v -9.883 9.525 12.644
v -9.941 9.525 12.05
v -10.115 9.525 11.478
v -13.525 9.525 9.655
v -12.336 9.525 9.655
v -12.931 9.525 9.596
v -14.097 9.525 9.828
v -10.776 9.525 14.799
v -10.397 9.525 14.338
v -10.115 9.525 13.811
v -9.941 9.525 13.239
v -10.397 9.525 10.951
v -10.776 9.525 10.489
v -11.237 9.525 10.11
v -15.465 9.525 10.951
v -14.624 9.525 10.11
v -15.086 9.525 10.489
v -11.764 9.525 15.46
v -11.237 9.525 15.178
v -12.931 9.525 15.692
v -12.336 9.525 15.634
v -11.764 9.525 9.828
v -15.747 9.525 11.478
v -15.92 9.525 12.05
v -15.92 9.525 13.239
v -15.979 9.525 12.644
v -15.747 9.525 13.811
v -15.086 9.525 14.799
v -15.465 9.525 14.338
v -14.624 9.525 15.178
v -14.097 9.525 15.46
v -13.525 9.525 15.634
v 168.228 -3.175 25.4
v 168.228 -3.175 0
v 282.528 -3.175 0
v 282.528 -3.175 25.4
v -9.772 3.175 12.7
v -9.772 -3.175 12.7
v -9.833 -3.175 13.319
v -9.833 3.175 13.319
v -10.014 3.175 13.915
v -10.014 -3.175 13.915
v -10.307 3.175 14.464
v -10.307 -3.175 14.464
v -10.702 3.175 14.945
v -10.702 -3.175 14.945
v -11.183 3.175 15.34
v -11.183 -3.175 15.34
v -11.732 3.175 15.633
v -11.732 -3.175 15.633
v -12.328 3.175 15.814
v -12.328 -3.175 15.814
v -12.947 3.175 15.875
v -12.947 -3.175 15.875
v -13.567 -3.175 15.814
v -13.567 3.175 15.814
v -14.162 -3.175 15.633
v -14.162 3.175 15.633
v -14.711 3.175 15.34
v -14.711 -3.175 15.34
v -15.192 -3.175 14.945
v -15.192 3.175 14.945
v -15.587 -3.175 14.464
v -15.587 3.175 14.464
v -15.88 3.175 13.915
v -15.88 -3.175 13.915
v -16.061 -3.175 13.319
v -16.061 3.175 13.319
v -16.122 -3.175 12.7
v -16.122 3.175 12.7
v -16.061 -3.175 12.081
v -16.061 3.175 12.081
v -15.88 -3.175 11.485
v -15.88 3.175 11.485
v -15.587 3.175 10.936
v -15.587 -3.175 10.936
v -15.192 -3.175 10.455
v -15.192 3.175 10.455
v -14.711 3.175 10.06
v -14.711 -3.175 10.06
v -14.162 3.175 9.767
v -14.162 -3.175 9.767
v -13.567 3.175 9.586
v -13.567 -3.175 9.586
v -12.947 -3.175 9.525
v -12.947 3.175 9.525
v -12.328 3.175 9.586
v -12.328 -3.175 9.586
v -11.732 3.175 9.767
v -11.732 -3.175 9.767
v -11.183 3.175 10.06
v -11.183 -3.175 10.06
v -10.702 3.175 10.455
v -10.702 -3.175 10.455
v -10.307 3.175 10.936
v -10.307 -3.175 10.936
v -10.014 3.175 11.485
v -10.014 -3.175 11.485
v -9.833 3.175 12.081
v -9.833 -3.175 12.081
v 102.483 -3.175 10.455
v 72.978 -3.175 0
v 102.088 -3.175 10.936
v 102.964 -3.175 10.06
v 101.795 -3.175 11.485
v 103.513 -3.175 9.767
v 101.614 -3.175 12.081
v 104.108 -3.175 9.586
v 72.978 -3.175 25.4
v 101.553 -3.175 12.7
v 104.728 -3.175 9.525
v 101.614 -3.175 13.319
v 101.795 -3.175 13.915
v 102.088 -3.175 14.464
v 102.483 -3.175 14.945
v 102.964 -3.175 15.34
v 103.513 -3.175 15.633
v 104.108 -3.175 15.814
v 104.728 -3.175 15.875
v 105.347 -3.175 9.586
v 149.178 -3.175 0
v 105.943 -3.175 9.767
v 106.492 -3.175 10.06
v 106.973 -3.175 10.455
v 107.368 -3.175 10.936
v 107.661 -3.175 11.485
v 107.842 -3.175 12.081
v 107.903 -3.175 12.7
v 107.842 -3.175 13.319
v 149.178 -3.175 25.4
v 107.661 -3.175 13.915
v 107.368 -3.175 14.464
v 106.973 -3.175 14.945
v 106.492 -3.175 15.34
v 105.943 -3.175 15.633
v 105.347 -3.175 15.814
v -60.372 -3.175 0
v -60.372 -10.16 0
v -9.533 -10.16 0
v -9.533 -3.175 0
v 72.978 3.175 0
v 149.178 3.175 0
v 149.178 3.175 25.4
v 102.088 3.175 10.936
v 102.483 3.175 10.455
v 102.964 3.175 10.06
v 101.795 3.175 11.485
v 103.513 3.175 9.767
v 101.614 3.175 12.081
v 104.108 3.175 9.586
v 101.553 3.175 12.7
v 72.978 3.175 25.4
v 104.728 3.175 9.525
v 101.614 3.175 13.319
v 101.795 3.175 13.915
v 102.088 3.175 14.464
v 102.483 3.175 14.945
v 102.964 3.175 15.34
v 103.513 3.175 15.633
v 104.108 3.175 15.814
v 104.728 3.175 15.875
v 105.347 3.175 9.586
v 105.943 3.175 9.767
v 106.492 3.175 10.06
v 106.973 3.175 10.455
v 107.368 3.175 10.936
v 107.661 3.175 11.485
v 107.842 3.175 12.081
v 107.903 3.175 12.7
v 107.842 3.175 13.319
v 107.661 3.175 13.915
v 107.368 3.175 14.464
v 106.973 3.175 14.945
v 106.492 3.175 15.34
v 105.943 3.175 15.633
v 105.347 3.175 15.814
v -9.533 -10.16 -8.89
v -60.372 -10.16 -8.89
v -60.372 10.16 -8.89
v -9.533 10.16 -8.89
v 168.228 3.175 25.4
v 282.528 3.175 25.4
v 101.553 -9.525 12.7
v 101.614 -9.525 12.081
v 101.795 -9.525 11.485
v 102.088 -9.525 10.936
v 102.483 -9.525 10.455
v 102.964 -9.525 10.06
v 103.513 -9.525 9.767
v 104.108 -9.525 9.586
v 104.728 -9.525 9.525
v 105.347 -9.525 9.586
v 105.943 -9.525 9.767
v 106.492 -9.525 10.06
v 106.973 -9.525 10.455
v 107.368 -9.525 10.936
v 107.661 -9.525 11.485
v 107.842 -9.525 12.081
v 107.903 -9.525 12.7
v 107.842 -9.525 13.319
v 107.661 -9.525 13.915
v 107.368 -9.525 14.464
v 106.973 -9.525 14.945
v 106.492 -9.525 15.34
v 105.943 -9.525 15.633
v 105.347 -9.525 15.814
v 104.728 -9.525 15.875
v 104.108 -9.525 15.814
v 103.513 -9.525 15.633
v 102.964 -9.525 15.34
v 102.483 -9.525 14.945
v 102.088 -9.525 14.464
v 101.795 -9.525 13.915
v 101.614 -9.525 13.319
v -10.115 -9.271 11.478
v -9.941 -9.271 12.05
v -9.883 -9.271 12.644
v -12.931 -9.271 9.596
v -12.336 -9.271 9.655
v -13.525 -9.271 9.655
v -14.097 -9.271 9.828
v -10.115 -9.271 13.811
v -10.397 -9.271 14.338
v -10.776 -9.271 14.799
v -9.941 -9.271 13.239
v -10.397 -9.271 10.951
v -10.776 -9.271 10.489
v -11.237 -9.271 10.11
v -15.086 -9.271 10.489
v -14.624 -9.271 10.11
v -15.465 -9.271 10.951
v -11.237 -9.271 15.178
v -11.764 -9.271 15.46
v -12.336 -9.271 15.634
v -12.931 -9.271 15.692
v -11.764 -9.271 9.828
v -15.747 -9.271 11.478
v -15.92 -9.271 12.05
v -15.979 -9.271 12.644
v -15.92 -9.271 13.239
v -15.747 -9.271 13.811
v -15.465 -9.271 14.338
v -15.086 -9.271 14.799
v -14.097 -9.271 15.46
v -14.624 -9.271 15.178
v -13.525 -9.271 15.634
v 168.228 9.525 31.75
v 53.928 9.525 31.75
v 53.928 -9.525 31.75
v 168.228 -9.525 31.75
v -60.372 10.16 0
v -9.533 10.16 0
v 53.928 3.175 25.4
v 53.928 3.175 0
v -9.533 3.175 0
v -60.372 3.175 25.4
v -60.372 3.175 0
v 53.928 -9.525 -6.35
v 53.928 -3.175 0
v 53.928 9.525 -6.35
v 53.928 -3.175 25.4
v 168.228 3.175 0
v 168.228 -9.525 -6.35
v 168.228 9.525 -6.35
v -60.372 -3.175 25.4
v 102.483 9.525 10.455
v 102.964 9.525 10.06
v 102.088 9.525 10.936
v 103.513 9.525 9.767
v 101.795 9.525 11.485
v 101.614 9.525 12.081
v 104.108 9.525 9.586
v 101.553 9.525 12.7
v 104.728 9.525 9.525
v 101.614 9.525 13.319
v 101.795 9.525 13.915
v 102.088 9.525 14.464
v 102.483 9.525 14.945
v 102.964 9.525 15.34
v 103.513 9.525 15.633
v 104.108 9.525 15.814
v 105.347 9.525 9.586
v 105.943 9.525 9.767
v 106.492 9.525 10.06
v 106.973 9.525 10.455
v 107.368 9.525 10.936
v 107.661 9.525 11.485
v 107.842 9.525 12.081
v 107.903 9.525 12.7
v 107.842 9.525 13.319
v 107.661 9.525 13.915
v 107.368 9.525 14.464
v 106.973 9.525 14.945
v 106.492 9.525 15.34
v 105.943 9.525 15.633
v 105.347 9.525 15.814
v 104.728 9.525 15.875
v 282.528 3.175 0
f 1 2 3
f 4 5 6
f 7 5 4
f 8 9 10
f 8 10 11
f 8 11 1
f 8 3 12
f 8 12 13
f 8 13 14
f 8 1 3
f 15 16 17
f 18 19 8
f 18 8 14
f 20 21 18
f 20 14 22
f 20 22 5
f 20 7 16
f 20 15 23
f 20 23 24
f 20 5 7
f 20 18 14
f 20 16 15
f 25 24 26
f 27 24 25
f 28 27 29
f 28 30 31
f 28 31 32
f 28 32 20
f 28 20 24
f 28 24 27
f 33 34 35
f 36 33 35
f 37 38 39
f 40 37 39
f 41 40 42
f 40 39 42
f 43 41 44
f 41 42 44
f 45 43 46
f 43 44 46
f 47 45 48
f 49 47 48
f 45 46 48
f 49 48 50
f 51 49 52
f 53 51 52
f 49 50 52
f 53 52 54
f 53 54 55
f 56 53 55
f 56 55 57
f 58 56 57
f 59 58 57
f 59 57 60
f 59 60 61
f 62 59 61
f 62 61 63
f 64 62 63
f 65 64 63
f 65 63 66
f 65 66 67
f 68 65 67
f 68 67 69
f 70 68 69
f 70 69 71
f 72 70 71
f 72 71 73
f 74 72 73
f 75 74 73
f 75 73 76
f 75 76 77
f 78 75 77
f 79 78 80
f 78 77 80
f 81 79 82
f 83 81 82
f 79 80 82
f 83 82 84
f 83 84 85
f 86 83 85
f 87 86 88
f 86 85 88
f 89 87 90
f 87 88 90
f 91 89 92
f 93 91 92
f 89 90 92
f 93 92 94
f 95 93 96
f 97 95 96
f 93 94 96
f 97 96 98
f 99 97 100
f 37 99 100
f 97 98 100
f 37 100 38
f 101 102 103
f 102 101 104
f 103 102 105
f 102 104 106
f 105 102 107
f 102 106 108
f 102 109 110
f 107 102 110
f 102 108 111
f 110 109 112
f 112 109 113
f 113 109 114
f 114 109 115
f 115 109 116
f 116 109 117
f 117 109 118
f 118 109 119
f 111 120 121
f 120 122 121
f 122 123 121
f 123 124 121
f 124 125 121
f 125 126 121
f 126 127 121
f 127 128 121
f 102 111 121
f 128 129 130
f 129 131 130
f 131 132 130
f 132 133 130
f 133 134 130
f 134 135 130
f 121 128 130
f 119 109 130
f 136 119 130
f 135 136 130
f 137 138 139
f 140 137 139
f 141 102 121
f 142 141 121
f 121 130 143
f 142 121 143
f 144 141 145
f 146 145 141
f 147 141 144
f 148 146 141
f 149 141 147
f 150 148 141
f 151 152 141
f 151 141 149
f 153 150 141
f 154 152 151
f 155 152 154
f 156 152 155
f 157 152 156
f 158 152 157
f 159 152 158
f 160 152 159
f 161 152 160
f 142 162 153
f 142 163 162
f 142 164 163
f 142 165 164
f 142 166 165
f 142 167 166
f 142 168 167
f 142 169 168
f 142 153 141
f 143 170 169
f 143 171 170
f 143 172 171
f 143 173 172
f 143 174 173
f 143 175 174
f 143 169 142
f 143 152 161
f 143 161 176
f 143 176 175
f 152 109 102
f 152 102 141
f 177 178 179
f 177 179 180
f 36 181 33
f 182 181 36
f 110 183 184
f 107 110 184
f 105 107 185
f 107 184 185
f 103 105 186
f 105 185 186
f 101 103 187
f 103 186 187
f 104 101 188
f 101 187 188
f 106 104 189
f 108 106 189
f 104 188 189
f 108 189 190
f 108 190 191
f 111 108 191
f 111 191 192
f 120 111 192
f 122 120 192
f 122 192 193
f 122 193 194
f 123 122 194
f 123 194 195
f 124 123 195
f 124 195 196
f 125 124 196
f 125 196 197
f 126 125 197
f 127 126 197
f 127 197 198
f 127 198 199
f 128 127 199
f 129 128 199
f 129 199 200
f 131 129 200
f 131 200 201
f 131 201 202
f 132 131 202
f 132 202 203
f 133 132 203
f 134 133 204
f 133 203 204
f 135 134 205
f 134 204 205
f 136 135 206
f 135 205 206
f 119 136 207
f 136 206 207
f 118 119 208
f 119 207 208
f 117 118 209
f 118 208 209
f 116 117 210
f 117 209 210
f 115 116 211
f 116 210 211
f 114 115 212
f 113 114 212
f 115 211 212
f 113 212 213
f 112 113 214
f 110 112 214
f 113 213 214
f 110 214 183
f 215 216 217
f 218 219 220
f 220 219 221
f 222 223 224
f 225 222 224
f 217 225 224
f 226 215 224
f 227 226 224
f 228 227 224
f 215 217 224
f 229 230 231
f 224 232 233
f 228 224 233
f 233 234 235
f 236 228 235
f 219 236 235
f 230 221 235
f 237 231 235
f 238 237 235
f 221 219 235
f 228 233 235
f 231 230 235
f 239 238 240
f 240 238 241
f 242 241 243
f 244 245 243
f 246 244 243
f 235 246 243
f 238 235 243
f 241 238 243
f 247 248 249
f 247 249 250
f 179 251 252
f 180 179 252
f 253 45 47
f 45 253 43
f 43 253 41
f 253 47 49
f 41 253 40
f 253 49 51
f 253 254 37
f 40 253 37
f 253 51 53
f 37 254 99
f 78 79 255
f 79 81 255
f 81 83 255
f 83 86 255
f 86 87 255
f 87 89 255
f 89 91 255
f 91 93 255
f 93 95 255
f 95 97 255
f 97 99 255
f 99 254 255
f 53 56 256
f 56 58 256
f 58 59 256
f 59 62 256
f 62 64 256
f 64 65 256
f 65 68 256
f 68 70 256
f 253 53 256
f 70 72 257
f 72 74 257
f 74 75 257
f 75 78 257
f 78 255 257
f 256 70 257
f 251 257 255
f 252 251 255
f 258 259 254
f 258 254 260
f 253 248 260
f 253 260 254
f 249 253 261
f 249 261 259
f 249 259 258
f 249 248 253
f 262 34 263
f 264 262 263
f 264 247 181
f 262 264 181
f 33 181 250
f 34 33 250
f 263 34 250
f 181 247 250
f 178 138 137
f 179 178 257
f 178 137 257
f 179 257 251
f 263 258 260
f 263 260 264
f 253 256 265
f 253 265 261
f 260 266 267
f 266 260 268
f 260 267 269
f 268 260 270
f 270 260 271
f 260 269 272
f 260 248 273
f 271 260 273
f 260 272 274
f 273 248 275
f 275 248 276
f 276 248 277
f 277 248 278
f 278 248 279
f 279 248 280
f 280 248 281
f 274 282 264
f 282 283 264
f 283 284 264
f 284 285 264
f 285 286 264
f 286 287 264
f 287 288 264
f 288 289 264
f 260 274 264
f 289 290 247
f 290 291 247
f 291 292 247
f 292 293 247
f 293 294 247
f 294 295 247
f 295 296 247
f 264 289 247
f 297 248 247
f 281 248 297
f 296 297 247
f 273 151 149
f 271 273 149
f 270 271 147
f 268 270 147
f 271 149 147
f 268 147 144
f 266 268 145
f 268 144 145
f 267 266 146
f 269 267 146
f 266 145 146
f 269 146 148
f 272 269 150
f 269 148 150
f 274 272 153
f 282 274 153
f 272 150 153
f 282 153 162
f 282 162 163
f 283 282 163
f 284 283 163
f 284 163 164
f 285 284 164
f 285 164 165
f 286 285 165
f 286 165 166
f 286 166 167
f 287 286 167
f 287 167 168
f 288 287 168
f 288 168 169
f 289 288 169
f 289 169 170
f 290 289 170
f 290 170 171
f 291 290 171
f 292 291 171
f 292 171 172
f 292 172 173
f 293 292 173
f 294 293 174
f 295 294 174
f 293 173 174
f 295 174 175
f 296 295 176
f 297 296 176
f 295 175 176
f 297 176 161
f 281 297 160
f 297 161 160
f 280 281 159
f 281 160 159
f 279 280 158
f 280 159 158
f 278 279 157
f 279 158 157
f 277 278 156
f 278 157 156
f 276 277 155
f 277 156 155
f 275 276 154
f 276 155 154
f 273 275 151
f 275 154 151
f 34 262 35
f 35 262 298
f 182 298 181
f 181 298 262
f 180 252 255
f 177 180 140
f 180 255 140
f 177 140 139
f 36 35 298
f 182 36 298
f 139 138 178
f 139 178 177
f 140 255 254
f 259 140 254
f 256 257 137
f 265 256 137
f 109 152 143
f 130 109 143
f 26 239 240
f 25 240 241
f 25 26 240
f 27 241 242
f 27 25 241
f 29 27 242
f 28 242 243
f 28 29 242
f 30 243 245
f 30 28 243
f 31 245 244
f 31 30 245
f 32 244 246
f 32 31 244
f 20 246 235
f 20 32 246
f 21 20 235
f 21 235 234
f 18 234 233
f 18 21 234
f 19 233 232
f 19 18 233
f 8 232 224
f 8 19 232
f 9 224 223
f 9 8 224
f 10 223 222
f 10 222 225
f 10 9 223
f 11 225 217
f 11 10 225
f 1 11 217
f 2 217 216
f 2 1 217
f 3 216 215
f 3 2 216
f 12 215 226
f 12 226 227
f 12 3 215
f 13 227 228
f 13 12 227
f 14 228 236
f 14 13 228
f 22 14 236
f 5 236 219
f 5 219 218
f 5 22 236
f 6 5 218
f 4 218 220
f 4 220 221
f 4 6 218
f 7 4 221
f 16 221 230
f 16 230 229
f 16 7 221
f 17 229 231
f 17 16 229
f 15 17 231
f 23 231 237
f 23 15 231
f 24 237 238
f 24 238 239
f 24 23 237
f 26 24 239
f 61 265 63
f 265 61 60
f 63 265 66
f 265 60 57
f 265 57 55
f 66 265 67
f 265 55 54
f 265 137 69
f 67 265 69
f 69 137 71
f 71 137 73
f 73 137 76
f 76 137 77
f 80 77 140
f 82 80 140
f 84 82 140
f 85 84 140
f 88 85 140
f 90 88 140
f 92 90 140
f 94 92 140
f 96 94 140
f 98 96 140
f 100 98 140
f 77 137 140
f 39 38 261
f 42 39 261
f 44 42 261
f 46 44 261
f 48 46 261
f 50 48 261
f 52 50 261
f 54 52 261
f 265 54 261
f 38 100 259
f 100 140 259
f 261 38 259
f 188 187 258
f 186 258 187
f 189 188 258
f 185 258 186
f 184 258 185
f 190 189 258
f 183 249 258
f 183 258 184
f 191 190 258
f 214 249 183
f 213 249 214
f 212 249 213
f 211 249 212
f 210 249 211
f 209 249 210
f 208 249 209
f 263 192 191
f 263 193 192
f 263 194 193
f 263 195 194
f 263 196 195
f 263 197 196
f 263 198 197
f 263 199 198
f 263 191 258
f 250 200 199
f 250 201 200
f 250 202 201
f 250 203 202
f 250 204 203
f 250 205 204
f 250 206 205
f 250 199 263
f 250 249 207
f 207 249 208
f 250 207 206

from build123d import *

# Parameters (mm, degrees)
F1_DEPTH  = 25.4
F2_W      = 76.2
F2_H      = 6.35
F3_DEPTH  = 25.4
F5_DEPTH  = 25.4
F6_W      = 114.3
F6_H      = 19.05
F7_DEPTH  = 6.35
F8_W      = 114.3
F8_H      = 19.05
F9_DEPTH  = 6.35
F10_R     = 3.175
F11_DEPTH = 25.4
F12_W     = 50.839655
F12_H     = 10.16
F13_DEPTH = 8.89
F14_R     = 3.048
F15_DEPTH = 18.796


with BuildPart() as f1:
    # F0 (on Top) → F1 (new body)
    with BuildSketch(Plane.XY):
        Polygon((-60.372166, 3.175), (-60.372166, 0), (-60.372166, -3.175), (53.927834, -3.175), (53.927834, -9.525), (168.227834, -9.525), (168.227834, -3.175), (282.527834, -3.175), (282.527834, 3.175), (168.227834, 3.175), (168.227834, 9.525), (53.927834, 9.525), (53.927834, 3.175), align=None)
    extrude(amount=F1_DEPTH)

    # F2 (on face) → F3 (cut)
    with BuildSketch(Plane.XY.offset(25.4)):
        with Locations((111.077834, 0)):
            Rectangle(F2_W, F2_H)
    extrude(amount=-F3_DEPTH, mode=Mode.SUBTRACT)

    # F4 (on face) → F5 (cut)
    with BuildSketch(Plane.XZ.offset(9.525)):
        with BuildLine():
            ThreePointArc((107.902834, 12.7), (104.727834, 15.875), (101.552834, 12.7))
            ThreePointArc((101.552834, 12.7), (104.727834, 9.525), (107.902834, 12.7))
        make_face()
    extrude(amount=-F5_DEPTH, mode=Mode.SUBTRACT)

    # F6 (on face) → F7 (join)
    with BuildSketch(Plane.XY.offset(25.4)):
        with Locations((111.077834, 0)):
            Rectangle(F6_W, F6_H)
    extrude(amount=F7_DEPTH)

    # F8 (on face) → F9 (join)
    with BuildSketch(Plane(origin=(0, 0, 0), x_dir=(1, 0, 0), z_dir=(0, 0, -1))):
        with Locations((111.077834, 0)):
            Rectangle(F8_W, F8_H)
    extrude(amount=F9_DEPTH)

    # F10 (on face) → F11 (cut)
    with BuildSketch(Plane.XZ.offset(3.175)):
        with Locations((-12.947108, 12.7)):
            Circle(F10_R)
    extrude(amount=-F11_DEPTH, mode=Mode.SUBTRACT)

    # F12 (on face) → F13 (join)
    with BuildSketch(Plane(origin=(0, 0, 0), x_dir=(1, 0, 0), z_dir=(0, 0, -1))):
        with Locations((-34.952338, 5.08)):
            Rectangle(F12_W, F12_H)
        with Locations((-34.952338, -5.08)):
            Rectangle(F12_W, F12_H)
    extrude(amount=F13_DEPTH)


with BuildPart() as f15:
    # F14 (on face) → F15 (new body)
    with BuildSketch(Plane(origin=(0, 9.525, 0), x_dir=(-1, 0, 0), z_dir=(0, 1, 0))):
        with Locations((12.930862, 12.644155)):
            Circle(F14_R)
    extrude(amount=-F15_DEPTH)


solid = Compound([f1.part, f15.part])
